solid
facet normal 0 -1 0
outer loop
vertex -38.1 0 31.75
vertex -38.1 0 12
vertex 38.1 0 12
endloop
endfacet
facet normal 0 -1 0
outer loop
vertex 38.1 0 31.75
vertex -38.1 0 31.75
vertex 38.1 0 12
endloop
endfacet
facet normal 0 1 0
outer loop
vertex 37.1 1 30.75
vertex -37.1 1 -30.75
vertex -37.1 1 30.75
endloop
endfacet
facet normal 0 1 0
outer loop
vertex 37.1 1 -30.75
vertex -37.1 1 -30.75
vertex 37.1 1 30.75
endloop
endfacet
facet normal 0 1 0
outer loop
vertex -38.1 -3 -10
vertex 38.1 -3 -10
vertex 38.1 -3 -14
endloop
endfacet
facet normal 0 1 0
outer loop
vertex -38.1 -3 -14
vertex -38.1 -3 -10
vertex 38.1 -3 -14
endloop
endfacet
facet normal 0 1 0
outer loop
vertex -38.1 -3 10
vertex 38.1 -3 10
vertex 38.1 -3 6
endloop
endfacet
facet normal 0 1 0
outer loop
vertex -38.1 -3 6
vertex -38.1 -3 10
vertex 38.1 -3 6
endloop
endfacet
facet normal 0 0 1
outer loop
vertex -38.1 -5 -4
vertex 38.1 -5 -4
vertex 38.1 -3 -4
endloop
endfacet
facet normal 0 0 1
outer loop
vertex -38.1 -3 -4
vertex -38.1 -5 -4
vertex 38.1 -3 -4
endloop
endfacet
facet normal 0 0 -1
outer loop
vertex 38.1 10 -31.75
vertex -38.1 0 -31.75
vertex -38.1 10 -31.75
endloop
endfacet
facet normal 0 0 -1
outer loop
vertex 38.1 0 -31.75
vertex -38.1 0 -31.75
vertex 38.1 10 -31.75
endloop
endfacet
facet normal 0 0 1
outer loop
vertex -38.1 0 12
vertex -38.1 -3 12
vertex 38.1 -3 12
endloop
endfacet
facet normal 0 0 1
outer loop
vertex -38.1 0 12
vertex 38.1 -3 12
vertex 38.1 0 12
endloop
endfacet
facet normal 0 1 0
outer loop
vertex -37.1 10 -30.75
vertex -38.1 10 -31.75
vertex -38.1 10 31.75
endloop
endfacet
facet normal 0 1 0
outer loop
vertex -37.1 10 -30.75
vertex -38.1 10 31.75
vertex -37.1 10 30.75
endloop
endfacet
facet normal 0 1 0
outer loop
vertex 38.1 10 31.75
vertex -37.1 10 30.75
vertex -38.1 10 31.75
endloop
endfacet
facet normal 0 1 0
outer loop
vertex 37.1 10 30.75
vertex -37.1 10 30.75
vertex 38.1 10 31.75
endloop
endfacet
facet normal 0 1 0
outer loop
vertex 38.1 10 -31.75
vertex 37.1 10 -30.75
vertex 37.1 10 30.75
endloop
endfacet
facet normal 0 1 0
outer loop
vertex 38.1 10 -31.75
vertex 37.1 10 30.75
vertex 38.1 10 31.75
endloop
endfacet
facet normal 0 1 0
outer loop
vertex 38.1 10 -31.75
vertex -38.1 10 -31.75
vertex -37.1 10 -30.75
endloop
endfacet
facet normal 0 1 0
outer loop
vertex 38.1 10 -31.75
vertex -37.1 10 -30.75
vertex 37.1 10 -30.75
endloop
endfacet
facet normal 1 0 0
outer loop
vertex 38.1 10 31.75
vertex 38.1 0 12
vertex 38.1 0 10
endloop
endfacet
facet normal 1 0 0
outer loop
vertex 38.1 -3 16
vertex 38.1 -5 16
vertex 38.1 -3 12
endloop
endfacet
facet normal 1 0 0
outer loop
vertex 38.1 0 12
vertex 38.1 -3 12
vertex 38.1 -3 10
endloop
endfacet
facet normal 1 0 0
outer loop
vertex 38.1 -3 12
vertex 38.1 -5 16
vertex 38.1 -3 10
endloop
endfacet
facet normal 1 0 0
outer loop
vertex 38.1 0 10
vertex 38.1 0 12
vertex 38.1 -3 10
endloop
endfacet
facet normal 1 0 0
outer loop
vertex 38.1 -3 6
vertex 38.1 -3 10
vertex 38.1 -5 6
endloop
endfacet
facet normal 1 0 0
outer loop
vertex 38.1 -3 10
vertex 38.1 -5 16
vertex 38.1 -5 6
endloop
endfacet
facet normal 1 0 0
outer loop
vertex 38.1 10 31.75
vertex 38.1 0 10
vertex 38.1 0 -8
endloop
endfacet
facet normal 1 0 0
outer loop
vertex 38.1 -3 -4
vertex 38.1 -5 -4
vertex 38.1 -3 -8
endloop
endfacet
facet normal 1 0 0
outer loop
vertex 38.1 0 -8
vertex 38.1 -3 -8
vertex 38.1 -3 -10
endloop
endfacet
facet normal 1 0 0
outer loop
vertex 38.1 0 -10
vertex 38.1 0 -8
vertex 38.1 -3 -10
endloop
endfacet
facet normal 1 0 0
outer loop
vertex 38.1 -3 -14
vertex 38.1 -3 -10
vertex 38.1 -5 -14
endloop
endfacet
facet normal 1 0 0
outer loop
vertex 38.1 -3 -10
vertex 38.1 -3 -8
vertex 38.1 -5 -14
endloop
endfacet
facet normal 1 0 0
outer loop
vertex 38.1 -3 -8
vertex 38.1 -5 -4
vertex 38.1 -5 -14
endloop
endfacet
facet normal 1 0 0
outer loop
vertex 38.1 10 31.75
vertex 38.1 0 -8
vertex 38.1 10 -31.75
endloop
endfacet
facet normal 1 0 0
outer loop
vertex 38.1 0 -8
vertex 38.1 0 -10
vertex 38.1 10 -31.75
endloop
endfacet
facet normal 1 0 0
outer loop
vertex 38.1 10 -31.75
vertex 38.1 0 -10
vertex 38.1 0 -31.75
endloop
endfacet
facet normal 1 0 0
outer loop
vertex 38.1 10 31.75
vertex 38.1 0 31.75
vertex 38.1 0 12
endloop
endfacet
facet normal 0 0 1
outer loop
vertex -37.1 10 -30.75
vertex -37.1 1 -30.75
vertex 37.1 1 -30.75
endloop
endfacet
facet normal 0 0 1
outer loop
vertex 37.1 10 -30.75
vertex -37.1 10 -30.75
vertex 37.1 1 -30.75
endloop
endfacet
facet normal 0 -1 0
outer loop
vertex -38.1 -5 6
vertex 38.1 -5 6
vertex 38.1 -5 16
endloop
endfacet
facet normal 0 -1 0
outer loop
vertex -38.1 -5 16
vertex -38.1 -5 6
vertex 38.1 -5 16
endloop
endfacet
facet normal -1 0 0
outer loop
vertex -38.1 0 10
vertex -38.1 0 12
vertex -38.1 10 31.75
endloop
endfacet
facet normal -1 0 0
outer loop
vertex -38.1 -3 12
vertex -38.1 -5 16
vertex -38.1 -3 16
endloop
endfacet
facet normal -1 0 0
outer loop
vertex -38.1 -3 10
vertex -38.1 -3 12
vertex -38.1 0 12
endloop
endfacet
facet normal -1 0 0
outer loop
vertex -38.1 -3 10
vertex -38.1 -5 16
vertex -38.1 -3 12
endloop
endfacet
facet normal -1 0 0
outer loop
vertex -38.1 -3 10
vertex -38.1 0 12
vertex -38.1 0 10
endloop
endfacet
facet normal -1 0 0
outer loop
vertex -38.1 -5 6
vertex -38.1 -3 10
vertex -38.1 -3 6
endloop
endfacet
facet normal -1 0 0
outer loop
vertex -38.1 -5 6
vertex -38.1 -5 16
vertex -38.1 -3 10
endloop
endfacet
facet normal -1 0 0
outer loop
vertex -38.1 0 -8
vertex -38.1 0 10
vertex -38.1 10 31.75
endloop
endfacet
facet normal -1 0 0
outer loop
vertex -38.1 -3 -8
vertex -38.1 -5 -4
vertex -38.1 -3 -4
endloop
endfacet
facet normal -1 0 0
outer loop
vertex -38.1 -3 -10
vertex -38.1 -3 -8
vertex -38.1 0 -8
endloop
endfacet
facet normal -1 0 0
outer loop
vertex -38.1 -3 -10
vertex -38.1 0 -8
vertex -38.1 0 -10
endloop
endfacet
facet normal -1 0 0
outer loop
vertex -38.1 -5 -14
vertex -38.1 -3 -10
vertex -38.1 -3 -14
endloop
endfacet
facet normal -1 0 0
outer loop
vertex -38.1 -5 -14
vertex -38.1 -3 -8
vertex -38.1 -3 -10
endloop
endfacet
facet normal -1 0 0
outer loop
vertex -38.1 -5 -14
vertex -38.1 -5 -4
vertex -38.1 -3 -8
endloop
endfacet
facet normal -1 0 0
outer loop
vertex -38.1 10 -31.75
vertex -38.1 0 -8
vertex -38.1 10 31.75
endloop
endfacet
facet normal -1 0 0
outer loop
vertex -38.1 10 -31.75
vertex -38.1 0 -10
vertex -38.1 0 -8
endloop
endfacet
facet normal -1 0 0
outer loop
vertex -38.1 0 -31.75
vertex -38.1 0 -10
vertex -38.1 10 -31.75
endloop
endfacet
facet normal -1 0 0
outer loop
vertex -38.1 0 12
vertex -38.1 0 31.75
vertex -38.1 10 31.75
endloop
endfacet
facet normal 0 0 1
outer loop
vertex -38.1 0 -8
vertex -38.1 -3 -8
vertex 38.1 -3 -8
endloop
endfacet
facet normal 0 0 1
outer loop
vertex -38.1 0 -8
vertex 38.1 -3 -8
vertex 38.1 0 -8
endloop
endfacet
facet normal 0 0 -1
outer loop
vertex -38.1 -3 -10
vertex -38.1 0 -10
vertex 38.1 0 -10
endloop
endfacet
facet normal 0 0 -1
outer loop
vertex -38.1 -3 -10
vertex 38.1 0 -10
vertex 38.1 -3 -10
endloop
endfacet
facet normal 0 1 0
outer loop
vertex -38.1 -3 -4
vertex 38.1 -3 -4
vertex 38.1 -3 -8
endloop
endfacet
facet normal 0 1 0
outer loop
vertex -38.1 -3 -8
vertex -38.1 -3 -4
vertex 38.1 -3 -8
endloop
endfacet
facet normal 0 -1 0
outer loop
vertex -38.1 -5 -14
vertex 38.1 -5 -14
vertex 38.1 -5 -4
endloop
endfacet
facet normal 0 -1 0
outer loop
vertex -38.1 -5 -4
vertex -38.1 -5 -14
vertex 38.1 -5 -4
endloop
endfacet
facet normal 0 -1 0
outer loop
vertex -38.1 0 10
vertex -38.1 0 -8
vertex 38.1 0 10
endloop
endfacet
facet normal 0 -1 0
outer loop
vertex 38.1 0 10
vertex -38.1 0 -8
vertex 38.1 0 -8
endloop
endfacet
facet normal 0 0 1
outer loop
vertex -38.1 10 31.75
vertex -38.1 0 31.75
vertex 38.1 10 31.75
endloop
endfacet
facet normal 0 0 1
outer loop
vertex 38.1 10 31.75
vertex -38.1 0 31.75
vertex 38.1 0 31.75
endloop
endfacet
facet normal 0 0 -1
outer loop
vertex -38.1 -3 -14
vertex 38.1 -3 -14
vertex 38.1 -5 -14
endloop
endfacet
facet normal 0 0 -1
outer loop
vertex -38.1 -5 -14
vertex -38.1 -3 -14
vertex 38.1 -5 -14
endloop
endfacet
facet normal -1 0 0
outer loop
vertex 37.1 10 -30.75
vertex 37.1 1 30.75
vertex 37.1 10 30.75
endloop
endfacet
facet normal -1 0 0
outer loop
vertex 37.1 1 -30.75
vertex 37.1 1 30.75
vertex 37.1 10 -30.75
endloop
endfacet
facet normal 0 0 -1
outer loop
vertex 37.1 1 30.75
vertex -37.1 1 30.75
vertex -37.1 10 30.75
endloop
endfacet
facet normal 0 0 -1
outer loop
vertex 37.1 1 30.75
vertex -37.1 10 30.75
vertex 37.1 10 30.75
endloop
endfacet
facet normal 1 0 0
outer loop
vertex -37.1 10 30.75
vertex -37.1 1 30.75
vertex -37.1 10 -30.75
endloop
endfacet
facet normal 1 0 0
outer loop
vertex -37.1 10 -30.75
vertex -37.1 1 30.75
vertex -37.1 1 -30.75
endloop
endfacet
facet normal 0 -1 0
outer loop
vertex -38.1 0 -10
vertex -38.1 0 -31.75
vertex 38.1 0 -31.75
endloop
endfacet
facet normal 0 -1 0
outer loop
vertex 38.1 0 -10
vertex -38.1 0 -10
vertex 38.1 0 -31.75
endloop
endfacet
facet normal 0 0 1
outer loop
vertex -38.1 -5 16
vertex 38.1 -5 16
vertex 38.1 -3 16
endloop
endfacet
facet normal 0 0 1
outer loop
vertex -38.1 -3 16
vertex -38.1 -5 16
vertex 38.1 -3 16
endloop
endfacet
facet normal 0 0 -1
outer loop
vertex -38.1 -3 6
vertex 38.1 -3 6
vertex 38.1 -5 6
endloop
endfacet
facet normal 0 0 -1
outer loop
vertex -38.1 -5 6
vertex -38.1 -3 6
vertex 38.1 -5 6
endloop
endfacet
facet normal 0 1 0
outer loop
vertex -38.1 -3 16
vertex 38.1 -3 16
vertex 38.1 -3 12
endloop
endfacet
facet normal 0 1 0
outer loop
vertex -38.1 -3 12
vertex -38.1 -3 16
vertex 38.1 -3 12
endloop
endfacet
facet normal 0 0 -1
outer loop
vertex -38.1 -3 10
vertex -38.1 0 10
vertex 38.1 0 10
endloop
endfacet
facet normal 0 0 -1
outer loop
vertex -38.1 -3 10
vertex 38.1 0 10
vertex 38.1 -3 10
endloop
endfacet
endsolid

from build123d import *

# Parameters (mm, degrees)
SKETCH1_W           = 76.2
SKETCH1_H           = 63.5
BOSS_EXTRUDE1_DEPTH = 10
SHELL1_T            = -1
BOSS_EXTRUDE2_DEPTH = 76.2
LPATTERN1_COUNT     = 2
LPATTERN1_PITCH     = 20


with BuildPart() as part:
    # Sketch1 → Boss-Extrude1 (new body)
    with BuildSketch(Plane(origin=(0, 0, 0), x_dir=(1, 0, 0), z_dir=(0, 1, 0))):
        Rectangle(SKETCH1_W, SKETCH1_H)
    extrude(amount=BOSS_EXTRUDE1_DEPTH)

    # Shell1
    shell1_openings = [part.faces().sort_by_distance(p)[0] for p in [
        (0, 10, 0),
    ]]
    offset(amount=SHELL1_T, openings=shell1_openings, kind=Kind.INTERSECTION)

    # Sketch2 → Boss-Extrude2 (add)
    with BuildSketch(Plane(origin=(38.1, 0, 0), x_dir=(0, 0, -1), z_dir=(1, 0, 0))):
        Polygon((10, -3), (14, -3), (14, -5), (4, -5), (4, -3), (8, -3), (8, 0), (10, 0), align=None)
    boss_extrude2 = extrude(amount=-BOSS_EXTRUDE2_DEPTH)

    # LPattern1: Boss-Extrude2 ×2
    with Locations(*[(0, 0, i * LPATTERN1_PITCH) for i in range(1, LPATTERN1_COUNT)]):
        add(boss_extrude2)


solid = part.part
